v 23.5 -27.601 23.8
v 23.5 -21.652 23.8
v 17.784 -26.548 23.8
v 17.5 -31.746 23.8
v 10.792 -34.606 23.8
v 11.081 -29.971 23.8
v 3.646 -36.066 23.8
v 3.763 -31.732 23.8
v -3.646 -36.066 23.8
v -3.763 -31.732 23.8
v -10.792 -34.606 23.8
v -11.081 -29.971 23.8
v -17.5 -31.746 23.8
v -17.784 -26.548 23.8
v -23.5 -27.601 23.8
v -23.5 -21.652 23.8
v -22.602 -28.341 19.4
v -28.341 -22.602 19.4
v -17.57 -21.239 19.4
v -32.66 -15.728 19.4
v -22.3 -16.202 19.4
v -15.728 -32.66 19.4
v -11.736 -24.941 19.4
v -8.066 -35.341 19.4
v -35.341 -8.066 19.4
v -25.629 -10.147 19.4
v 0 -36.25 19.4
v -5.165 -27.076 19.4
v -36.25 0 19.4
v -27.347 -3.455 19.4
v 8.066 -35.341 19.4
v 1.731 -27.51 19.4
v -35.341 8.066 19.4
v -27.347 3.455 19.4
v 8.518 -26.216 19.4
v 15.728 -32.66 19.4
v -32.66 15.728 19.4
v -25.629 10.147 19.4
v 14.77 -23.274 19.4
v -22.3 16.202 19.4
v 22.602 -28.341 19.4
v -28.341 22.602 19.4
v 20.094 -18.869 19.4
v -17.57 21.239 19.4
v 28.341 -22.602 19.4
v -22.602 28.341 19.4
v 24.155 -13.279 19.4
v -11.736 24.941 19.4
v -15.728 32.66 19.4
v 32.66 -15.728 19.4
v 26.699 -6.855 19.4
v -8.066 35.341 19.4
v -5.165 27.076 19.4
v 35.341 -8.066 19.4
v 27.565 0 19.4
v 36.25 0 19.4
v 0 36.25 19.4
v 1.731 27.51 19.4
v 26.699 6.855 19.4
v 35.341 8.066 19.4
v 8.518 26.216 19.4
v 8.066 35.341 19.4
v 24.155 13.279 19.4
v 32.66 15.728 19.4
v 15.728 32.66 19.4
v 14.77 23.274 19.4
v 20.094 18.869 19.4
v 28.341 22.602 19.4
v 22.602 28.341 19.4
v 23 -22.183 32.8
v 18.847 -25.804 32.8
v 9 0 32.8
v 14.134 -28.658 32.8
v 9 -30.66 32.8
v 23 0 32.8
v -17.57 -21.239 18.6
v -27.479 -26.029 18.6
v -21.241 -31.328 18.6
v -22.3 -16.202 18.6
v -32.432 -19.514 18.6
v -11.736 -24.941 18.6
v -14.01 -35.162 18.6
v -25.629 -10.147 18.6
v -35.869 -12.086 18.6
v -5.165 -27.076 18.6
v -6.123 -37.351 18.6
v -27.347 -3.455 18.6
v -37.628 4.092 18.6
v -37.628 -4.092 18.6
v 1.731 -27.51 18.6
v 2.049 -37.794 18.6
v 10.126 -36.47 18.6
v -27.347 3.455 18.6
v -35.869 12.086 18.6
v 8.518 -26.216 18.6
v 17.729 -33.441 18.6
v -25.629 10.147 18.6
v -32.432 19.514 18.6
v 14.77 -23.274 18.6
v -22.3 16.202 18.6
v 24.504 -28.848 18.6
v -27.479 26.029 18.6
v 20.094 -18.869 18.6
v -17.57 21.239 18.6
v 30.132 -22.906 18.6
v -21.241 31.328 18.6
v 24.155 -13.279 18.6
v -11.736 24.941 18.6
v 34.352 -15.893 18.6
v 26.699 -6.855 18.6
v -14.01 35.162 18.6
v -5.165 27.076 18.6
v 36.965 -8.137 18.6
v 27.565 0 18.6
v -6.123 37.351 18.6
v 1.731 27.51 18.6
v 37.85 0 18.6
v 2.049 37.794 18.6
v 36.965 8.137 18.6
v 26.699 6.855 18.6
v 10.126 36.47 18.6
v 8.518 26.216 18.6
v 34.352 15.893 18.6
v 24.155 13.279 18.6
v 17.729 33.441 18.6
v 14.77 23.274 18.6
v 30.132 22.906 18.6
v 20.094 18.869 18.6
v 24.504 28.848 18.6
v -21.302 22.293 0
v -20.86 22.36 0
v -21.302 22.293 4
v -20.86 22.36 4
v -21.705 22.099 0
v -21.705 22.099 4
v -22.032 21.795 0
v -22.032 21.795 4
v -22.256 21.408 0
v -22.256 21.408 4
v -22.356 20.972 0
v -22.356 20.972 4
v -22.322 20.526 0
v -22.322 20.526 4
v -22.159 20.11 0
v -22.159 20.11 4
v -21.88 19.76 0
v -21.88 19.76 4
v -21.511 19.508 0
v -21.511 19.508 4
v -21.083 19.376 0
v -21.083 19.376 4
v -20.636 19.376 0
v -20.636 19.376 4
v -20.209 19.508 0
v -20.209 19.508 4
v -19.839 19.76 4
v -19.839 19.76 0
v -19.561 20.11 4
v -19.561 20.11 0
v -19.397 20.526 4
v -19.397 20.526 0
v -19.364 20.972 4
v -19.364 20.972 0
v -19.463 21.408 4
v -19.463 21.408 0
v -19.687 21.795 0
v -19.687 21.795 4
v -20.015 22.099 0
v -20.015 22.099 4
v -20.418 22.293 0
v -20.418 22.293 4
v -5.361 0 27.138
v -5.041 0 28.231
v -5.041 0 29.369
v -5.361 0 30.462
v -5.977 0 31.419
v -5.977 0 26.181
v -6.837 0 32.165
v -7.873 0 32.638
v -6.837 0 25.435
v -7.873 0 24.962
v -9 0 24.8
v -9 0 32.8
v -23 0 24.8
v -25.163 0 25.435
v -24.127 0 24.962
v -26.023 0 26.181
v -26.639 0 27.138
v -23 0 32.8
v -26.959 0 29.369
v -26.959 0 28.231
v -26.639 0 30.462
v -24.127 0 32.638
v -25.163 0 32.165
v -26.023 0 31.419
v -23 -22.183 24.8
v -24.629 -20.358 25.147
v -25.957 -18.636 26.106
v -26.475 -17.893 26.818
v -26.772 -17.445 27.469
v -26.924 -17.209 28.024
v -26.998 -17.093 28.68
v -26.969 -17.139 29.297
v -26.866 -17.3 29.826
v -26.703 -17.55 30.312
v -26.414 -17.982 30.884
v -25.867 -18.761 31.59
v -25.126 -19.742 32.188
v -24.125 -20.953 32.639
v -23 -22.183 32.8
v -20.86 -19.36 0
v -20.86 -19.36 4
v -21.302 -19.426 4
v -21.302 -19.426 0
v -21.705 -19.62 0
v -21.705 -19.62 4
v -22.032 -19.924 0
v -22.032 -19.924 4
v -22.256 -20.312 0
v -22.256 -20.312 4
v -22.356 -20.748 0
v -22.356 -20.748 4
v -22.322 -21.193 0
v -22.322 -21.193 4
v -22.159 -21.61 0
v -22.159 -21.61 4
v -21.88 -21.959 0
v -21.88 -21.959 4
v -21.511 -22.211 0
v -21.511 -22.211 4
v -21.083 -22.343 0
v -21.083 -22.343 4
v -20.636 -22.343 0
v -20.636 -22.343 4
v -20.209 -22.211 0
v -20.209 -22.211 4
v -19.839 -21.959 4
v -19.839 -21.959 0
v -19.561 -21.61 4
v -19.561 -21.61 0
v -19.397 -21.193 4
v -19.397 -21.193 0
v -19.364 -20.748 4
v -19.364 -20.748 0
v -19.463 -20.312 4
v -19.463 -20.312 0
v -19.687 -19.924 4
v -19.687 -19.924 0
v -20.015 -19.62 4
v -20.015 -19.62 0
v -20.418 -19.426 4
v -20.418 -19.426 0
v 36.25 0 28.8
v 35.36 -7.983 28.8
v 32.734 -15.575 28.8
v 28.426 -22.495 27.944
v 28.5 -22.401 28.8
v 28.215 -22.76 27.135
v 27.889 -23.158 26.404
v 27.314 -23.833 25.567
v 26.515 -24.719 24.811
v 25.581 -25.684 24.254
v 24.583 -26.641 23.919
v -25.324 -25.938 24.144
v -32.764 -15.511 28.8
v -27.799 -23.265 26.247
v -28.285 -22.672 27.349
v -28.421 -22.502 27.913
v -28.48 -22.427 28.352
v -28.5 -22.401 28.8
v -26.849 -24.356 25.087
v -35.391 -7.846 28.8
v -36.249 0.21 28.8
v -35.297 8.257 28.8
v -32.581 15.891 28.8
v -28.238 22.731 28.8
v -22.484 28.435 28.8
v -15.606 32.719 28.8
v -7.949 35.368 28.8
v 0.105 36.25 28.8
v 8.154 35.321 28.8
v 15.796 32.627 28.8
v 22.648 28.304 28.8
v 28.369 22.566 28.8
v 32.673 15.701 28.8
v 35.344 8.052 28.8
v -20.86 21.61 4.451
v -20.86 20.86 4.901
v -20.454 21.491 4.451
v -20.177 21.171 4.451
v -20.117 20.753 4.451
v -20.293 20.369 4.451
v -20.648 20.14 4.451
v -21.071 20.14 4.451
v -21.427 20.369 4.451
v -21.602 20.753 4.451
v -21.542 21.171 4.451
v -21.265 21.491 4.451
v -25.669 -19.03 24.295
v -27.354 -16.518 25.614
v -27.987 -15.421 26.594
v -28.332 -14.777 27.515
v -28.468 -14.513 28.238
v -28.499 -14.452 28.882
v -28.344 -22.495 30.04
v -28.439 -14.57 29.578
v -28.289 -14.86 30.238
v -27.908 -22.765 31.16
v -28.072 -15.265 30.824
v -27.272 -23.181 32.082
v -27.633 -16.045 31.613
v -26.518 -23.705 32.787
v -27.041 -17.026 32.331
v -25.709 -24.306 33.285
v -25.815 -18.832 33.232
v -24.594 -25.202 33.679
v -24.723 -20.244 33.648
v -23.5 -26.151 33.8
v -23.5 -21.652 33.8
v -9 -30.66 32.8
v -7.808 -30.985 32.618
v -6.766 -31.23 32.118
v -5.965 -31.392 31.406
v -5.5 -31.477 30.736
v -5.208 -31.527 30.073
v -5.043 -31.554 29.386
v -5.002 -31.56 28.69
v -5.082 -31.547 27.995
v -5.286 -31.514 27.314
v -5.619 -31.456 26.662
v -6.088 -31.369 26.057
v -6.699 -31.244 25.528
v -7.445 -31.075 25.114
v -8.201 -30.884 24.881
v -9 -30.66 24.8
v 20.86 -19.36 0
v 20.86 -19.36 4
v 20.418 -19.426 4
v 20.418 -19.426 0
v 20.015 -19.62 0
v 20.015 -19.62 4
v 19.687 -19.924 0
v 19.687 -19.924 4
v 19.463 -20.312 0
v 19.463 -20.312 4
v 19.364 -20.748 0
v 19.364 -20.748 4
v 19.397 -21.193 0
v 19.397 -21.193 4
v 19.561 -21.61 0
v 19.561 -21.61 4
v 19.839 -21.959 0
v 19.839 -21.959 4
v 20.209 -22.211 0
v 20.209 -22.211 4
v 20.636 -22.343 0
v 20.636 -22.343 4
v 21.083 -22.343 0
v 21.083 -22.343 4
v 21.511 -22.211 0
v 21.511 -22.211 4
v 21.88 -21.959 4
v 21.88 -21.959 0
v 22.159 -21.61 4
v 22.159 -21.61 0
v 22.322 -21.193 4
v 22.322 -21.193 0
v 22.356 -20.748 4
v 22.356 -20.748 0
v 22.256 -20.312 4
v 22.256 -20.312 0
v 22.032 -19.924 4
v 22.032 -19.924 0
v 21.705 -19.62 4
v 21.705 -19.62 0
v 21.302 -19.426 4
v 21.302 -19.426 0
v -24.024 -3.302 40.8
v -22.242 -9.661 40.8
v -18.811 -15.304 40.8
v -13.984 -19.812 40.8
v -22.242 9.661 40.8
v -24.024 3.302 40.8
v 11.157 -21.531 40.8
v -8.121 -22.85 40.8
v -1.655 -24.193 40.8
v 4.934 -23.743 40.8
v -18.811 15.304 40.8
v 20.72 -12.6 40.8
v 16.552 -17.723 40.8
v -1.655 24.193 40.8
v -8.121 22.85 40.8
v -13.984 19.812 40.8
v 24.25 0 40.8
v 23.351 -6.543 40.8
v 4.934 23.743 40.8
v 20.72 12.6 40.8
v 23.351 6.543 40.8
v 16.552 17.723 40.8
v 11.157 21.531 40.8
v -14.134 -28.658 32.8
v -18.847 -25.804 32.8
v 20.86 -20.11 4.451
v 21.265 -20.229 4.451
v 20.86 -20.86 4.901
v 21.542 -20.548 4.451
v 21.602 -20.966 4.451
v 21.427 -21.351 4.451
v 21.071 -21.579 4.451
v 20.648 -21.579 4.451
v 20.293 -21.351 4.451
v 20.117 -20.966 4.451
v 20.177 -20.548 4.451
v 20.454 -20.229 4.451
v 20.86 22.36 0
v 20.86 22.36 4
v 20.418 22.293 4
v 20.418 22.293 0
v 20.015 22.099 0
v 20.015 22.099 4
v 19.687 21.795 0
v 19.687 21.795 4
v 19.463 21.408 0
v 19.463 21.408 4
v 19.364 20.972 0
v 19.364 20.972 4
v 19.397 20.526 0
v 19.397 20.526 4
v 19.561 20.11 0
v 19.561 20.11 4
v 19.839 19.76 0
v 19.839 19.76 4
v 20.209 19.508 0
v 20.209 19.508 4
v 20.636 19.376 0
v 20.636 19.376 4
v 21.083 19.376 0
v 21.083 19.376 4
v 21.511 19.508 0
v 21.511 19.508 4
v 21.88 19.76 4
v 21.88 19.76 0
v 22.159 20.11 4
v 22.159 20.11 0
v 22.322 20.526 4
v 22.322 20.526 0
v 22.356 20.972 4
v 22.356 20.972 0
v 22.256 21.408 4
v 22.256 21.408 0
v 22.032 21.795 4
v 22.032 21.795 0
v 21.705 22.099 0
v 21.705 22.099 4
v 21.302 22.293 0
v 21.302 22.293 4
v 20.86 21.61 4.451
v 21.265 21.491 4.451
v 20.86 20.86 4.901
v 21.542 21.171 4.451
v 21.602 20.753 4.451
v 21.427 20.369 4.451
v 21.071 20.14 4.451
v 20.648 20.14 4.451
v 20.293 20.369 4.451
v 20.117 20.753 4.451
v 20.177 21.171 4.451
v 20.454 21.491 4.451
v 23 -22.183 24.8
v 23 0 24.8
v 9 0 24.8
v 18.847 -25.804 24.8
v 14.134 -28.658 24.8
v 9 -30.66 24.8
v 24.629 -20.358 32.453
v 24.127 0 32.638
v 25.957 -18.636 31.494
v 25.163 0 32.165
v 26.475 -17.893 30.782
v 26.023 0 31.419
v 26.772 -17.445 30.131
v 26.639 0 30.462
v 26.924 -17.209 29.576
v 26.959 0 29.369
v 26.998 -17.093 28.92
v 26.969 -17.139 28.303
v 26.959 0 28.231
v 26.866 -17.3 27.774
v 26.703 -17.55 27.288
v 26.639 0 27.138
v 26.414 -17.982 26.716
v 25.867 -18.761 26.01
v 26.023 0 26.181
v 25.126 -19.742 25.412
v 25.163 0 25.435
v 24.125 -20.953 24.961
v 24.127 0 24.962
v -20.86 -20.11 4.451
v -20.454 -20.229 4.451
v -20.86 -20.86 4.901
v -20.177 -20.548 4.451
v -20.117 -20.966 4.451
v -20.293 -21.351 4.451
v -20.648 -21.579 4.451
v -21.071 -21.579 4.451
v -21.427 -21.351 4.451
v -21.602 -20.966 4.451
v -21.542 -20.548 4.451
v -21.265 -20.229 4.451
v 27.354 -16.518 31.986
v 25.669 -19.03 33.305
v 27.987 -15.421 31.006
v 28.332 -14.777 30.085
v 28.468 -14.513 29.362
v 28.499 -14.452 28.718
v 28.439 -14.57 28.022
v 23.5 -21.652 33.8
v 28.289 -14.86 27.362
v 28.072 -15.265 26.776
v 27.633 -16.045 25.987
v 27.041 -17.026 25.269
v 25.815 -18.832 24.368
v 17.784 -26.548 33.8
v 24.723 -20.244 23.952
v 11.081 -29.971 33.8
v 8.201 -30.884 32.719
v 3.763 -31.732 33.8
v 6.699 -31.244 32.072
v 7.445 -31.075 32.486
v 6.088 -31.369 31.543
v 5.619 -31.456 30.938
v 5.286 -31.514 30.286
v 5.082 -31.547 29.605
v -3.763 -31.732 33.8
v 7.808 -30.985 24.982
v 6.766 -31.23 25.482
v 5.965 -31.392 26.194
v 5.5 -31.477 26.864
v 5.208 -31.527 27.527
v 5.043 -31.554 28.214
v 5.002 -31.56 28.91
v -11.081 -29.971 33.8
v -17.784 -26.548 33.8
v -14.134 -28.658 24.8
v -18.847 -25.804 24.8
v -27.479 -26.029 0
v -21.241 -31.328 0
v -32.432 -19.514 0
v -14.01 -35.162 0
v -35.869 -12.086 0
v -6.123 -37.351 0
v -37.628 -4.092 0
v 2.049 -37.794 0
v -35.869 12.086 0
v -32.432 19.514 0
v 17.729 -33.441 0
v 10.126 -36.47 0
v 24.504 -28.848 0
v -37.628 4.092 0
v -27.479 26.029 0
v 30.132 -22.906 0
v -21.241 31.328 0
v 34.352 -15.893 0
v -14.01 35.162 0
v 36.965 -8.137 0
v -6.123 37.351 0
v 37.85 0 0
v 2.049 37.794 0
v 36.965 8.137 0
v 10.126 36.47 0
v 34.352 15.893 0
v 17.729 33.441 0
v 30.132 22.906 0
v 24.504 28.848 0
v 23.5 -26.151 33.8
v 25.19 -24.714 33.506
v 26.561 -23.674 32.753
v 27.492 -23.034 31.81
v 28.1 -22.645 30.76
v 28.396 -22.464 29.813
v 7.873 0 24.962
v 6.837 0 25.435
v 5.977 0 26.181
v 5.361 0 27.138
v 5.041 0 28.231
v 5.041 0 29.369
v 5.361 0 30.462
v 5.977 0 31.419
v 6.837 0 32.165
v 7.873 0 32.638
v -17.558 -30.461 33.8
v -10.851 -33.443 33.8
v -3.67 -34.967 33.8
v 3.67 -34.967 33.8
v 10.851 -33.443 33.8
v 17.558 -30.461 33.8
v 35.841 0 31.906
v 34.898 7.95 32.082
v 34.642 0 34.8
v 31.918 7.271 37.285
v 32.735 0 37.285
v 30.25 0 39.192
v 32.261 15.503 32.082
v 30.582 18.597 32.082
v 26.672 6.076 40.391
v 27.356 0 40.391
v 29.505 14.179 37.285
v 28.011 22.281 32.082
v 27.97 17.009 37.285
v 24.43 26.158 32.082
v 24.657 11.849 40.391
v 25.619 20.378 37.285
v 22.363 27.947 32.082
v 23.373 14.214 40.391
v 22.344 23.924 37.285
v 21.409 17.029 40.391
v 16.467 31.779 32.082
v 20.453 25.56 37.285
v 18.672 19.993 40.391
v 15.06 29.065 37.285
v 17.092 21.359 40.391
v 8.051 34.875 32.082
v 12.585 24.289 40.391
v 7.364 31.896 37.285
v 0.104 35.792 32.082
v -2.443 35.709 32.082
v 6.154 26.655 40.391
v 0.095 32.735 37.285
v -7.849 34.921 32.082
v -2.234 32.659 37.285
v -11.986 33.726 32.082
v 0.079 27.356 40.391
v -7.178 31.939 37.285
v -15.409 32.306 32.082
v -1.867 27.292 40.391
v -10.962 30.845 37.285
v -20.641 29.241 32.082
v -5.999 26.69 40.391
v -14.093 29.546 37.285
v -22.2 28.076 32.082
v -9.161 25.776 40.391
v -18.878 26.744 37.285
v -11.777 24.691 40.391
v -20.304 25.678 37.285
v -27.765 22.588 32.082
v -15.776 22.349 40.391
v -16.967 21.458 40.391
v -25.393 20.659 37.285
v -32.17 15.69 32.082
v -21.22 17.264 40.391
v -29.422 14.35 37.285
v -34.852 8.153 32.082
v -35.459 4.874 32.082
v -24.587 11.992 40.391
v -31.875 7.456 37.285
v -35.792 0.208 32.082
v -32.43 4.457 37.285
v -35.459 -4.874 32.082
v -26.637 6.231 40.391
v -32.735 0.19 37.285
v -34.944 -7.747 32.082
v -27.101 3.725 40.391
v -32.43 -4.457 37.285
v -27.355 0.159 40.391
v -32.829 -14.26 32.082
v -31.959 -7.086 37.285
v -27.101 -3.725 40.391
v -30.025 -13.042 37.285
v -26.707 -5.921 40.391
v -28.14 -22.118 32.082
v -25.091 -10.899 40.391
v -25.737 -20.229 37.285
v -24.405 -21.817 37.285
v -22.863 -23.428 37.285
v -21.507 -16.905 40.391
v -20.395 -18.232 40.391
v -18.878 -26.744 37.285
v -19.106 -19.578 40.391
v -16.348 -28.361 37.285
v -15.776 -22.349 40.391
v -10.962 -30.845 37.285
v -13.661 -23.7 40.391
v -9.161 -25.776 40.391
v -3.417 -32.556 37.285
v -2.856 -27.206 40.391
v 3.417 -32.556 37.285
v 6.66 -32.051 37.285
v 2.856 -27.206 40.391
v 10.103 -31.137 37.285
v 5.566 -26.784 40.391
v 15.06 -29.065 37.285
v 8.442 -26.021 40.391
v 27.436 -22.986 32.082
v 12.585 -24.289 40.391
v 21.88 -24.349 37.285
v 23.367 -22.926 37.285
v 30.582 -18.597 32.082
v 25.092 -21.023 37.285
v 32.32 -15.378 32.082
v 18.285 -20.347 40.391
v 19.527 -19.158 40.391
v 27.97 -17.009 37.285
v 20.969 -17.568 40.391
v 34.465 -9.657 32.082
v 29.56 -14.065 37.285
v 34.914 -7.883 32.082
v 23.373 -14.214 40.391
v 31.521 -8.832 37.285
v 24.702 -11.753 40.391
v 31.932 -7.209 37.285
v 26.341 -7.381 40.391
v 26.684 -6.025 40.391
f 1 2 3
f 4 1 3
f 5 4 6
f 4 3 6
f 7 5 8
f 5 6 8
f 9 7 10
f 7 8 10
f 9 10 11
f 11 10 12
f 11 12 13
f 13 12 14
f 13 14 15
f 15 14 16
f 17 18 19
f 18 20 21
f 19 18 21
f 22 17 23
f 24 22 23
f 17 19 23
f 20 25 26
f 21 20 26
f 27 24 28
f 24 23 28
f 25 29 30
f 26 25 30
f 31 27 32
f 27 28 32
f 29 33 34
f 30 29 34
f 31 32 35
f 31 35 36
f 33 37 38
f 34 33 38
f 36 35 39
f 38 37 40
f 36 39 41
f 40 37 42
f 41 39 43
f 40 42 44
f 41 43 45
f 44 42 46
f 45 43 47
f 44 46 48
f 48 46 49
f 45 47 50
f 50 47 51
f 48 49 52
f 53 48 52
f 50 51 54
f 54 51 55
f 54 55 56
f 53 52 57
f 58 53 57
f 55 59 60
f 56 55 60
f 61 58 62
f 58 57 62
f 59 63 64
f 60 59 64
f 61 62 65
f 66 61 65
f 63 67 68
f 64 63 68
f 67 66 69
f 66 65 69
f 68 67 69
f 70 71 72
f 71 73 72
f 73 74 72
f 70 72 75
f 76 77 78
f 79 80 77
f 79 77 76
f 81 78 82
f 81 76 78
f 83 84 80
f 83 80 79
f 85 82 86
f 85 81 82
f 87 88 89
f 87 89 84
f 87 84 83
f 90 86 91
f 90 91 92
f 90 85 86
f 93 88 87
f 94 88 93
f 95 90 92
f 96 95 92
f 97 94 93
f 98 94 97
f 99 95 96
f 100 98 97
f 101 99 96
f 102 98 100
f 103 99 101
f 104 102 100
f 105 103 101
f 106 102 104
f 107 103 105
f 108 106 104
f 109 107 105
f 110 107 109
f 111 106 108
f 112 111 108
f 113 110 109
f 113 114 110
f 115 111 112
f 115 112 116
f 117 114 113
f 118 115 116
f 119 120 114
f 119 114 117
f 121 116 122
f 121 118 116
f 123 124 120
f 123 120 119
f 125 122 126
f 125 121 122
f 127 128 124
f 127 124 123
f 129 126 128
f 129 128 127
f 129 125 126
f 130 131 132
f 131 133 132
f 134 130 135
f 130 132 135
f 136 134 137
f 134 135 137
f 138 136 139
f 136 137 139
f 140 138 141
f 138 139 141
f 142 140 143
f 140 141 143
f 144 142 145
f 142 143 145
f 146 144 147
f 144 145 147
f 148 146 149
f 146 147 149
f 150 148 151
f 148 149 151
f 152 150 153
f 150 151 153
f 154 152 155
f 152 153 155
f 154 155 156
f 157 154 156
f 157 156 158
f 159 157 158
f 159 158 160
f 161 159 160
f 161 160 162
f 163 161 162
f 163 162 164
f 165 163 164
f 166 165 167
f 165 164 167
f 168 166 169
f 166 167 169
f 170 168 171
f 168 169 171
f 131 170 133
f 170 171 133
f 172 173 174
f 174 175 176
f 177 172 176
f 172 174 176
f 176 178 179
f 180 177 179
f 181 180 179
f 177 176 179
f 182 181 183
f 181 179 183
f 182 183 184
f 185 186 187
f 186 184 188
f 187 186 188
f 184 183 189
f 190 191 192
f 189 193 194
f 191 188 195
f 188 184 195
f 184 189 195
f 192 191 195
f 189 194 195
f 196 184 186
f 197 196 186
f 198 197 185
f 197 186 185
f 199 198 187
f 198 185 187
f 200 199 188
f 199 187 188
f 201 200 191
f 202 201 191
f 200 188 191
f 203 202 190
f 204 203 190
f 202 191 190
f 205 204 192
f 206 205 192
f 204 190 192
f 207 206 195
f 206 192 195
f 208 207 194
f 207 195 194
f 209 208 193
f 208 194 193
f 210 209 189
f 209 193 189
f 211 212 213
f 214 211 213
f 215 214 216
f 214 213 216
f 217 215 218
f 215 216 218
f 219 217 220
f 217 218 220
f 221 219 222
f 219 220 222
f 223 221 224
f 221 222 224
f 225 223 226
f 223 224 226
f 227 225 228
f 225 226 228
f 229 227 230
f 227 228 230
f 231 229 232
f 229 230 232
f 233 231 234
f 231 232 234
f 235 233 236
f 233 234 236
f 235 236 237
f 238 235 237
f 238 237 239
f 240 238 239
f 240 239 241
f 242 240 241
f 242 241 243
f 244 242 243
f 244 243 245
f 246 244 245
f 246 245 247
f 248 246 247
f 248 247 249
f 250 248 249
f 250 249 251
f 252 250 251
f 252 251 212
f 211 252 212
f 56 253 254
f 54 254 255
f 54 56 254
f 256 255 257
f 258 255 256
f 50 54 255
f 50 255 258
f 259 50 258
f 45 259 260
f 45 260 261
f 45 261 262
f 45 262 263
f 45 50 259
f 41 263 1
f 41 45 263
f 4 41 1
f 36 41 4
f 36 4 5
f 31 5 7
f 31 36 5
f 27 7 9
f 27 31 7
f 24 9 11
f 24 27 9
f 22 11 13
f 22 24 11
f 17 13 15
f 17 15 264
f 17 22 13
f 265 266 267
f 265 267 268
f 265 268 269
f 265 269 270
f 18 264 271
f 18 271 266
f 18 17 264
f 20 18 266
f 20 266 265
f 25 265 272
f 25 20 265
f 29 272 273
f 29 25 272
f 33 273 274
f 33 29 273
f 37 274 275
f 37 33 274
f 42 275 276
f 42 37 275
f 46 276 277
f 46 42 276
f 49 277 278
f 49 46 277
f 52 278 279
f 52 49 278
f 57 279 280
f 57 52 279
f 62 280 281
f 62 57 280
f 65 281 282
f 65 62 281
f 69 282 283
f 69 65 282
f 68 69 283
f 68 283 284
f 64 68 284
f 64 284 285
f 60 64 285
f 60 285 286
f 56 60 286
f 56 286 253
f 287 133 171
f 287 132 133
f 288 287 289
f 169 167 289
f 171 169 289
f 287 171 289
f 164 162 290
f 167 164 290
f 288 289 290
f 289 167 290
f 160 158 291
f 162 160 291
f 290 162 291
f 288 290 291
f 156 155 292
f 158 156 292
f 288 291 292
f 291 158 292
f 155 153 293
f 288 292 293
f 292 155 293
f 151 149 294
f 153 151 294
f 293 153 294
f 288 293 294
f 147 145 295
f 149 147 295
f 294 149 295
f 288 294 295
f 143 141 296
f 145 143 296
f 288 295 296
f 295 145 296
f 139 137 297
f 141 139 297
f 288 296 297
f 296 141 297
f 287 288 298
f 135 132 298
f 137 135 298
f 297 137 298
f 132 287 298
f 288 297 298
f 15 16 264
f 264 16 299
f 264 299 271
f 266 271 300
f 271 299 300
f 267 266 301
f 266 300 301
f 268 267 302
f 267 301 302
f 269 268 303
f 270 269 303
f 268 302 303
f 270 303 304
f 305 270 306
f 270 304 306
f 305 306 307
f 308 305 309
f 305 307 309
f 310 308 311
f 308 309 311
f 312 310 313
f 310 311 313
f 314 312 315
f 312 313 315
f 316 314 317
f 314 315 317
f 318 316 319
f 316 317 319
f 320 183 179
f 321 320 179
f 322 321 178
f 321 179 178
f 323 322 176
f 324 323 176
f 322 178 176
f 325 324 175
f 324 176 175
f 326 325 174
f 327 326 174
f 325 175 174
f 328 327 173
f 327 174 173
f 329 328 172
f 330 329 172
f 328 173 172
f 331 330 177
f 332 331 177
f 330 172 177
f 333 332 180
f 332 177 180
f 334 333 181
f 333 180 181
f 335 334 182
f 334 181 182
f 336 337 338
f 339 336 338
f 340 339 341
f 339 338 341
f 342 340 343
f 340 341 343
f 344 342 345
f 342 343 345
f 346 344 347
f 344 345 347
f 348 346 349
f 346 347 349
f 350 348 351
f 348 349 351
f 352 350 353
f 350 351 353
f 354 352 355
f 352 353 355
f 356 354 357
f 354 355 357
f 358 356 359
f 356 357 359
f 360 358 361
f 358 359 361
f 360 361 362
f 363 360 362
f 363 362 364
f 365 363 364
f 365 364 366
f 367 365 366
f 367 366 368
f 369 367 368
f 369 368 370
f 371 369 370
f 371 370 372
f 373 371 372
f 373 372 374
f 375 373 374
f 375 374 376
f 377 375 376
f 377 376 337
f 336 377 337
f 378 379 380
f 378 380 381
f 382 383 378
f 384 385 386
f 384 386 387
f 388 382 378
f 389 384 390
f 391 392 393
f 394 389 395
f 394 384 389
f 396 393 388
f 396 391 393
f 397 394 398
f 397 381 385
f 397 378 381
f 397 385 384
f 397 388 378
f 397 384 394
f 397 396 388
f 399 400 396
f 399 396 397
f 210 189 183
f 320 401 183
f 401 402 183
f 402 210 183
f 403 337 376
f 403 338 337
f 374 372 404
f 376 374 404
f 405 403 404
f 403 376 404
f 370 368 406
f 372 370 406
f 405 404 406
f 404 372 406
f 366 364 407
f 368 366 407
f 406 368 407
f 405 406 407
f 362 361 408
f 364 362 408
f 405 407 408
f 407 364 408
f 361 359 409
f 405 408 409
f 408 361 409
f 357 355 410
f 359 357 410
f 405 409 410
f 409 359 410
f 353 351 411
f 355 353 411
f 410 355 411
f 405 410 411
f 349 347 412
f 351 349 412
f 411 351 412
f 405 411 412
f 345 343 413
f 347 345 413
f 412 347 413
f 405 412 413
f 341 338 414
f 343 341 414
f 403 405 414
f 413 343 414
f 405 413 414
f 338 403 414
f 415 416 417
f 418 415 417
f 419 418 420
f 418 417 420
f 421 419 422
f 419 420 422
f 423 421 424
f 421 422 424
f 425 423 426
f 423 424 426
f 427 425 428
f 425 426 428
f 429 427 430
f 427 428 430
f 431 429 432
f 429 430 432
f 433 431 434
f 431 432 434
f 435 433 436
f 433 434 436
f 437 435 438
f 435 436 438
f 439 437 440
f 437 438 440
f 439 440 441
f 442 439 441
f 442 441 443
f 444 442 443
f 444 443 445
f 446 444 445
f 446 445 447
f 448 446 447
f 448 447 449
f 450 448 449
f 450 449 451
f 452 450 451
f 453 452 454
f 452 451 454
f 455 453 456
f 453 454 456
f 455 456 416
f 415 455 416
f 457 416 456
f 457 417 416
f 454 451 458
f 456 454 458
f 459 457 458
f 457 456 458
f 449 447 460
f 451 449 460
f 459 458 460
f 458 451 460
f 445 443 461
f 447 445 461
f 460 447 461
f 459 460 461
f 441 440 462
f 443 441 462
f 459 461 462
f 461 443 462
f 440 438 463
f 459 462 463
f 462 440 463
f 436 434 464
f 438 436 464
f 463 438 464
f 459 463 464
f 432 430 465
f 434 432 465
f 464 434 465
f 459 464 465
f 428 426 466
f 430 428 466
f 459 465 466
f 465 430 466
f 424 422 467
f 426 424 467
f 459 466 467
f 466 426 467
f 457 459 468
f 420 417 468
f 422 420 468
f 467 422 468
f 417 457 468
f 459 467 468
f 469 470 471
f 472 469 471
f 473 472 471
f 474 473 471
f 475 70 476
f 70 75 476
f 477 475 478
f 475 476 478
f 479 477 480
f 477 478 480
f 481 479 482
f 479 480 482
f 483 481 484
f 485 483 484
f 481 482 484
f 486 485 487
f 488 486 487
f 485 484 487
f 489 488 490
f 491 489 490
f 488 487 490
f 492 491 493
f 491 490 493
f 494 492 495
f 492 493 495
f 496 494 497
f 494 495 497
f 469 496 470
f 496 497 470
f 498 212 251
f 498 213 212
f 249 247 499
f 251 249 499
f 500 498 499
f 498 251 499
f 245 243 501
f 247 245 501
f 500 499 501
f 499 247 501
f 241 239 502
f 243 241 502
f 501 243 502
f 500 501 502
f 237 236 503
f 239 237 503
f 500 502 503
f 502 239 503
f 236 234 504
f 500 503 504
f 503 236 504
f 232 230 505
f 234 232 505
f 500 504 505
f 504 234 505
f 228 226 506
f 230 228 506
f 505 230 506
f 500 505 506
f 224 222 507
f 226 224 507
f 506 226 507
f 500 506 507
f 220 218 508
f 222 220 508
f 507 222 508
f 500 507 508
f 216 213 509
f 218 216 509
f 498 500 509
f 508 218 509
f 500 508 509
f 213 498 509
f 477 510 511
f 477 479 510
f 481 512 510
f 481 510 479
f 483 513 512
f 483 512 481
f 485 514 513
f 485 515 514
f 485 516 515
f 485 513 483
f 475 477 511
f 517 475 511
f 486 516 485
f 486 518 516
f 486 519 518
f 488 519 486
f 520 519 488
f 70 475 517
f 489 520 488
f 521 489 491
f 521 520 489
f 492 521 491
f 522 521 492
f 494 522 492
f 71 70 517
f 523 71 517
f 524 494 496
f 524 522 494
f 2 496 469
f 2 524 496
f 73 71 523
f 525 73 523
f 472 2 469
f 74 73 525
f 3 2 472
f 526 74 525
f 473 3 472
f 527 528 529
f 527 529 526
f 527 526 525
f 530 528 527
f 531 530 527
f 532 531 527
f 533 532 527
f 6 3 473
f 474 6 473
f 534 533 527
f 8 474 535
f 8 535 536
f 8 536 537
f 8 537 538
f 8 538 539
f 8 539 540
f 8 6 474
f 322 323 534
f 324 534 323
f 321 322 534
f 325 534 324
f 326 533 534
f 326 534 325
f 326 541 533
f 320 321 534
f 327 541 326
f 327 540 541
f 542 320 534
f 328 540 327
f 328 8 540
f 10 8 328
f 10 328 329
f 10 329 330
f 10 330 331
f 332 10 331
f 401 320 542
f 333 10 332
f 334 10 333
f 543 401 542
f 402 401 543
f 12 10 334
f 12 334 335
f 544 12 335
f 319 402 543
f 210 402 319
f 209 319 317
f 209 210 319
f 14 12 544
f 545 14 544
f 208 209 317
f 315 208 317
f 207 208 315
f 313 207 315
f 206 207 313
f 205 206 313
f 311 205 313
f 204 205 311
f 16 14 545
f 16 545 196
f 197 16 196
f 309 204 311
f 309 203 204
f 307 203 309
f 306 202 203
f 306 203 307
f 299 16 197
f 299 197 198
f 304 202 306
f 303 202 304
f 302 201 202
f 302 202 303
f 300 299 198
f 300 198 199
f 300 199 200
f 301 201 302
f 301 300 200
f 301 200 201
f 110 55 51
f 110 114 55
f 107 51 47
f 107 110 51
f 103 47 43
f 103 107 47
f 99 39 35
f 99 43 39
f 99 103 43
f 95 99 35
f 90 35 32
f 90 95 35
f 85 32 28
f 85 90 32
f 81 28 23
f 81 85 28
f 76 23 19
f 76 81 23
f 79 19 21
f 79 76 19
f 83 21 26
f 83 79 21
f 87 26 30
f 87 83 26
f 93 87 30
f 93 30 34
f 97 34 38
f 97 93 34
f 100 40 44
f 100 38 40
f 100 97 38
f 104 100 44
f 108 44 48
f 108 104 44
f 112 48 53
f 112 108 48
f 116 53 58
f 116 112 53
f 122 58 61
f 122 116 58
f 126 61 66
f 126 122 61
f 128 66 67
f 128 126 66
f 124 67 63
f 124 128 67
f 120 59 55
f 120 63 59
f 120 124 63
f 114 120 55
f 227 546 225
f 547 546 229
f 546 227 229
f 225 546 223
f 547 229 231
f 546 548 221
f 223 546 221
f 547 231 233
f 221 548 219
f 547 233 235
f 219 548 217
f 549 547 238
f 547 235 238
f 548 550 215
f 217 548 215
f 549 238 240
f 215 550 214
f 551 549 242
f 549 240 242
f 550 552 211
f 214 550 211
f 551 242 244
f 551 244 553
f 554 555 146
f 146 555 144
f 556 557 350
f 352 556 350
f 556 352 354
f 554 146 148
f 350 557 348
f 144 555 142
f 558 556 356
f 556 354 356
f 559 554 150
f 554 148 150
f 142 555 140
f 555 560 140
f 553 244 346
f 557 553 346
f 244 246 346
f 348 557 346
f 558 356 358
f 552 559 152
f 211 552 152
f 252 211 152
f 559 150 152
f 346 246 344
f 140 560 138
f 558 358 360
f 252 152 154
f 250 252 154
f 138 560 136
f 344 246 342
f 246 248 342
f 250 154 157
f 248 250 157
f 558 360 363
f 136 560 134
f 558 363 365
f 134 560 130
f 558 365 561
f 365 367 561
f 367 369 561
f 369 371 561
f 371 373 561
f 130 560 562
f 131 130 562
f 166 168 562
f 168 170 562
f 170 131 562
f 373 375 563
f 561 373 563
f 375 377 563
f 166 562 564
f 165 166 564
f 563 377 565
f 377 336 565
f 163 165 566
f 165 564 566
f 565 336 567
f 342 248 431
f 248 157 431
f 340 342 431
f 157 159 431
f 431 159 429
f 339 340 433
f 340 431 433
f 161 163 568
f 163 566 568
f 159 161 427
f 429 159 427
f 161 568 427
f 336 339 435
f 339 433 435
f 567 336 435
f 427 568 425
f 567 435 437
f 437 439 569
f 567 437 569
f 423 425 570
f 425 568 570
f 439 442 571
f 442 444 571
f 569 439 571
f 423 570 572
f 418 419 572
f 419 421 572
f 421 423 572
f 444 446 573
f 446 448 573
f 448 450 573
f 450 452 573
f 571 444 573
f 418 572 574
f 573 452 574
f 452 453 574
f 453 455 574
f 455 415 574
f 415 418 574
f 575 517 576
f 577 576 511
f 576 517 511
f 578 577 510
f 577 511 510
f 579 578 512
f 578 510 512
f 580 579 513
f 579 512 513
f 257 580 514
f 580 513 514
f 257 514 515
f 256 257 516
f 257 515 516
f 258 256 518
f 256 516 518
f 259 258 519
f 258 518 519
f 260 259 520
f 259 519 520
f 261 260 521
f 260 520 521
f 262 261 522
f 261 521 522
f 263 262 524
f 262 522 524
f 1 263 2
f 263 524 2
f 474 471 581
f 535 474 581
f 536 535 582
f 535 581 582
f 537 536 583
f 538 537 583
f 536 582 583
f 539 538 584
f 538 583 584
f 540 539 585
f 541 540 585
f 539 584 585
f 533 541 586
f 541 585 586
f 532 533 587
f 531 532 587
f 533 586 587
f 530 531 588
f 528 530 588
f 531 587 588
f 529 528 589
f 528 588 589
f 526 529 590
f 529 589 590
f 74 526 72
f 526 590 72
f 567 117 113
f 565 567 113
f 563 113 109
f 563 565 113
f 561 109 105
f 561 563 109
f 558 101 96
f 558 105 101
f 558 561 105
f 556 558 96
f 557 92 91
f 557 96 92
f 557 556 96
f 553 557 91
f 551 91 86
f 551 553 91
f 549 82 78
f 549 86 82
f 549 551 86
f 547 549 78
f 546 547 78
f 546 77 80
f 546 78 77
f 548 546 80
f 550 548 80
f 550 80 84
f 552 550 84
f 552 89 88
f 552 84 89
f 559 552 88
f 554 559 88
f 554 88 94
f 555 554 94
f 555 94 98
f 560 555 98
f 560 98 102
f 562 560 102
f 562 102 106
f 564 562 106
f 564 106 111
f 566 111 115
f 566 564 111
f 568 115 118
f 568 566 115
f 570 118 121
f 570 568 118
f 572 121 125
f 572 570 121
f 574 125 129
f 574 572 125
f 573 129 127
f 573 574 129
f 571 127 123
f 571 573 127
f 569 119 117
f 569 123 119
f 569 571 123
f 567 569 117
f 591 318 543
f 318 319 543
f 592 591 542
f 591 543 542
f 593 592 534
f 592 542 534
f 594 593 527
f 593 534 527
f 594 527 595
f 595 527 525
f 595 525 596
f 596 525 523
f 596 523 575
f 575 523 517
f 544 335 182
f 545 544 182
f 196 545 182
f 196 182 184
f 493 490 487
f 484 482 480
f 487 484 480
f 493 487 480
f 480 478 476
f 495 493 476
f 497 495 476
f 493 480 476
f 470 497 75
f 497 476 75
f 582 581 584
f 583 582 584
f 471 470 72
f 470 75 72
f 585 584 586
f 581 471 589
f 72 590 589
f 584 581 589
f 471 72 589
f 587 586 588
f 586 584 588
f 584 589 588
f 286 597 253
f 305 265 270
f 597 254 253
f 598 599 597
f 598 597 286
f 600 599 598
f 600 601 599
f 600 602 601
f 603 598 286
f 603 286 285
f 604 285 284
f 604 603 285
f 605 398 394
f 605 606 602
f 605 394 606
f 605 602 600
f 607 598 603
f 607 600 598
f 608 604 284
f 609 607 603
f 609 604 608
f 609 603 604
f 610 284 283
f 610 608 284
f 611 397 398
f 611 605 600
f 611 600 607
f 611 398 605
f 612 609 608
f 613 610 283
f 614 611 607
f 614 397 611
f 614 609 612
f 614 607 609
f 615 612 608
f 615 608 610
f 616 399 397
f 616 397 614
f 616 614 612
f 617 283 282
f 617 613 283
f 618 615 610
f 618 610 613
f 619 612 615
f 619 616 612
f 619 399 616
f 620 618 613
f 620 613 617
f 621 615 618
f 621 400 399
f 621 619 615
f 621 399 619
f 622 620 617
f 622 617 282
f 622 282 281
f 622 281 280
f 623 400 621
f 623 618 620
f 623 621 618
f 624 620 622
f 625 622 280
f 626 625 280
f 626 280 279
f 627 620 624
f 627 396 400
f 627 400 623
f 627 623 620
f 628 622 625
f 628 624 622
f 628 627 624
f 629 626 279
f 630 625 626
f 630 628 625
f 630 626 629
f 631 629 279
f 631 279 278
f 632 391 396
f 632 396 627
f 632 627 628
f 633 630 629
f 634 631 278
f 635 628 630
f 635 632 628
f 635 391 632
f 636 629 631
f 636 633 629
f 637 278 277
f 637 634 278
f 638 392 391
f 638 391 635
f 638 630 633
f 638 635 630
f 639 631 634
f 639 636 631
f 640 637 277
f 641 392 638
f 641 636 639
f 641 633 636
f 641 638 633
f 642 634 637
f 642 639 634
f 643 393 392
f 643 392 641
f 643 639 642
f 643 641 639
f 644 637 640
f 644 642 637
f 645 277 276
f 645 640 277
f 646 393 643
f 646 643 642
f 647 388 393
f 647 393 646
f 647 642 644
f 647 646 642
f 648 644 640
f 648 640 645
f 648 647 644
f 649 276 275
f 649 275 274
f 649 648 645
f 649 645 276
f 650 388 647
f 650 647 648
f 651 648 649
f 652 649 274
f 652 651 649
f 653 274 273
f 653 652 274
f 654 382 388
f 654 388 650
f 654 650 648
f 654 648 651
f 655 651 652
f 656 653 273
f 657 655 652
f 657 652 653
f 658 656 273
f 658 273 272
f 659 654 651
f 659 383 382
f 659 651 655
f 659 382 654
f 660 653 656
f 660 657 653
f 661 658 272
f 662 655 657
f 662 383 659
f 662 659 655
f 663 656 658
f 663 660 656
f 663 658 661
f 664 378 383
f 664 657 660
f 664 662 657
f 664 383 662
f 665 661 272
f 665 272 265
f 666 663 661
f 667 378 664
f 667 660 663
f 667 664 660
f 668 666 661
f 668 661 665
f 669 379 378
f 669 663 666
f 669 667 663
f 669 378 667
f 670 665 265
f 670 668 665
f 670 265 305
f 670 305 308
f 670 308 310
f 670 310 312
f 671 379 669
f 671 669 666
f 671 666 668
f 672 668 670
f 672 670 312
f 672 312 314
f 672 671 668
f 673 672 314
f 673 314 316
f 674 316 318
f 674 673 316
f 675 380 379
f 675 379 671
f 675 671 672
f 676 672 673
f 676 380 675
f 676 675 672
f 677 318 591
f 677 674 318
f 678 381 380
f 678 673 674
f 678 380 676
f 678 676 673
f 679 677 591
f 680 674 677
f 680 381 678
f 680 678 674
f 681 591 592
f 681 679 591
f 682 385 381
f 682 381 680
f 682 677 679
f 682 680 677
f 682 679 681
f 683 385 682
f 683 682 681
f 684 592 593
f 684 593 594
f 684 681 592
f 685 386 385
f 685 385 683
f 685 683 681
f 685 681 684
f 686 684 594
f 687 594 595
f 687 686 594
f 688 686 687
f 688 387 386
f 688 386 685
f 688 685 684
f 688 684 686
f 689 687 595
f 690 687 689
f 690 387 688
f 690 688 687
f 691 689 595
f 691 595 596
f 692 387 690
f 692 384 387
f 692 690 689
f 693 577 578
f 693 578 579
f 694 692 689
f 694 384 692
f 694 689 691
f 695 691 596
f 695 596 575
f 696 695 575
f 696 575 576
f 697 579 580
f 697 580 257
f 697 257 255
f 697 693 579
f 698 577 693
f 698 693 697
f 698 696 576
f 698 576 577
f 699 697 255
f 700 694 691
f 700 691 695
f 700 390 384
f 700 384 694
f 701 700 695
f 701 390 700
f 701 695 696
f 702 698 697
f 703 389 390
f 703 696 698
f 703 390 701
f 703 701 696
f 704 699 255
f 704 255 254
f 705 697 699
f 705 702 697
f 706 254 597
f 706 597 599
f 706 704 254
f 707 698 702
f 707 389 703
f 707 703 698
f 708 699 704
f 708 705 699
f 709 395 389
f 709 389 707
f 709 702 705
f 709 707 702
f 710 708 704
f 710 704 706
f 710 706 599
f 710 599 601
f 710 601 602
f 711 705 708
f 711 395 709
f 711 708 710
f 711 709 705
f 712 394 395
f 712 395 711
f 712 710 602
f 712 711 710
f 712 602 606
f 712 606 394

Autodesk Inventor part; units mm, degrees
ref_plane "YZ Plane" through (0, 0, 0) normal (1, 0, 0) x (0, 1, 0)
ref_plane "XZ Plane" through (0, 0, 0) normal (0, 1, 0) x (-1, 0, 0)
ref_plane "XY Plane" through (0, 0, 0) normal (0, 0, 1) x (1, 0, 0)
sketch "Skizze1" plane through (0, 0, 0) normal (0, 0, 1) x (1, 0, 0)
  circle A0 centre (0, 0) radius 37.85
  dimension "d0" = 75.7
extrude "Extrusion1" add sketch "Skizze1" along normal blind 18.6
sketch "Skizze2" plane through (0, 0, 18.6) normal (0, 0, 1) x (1, 0, 0)
  circle A0 centre (0, 0) radius 37.85 projected
  circle A1 centre (0, 0) radius 27.5647
extrude "Extrusion2" add sketch "Skizze2" along normal blind 0.8 contours A1
sketch "Skizze3" plane through (0, 0, 19.4) normal (0, 0, 1) x (1, 0, 0)
  circle A0 centre (0, 0) radius 27.5647 projected
  circle A1 centre (0, 0) radius 36.25
  dimension "d5" = 72.5
extrude "Extrusion3" add sketch "Skizze3" along normal blind 21.4 contours A0 | A1
fillet "Rundung1" radius 12 1 edges at (-36.25, 0, 40.8)
sketch "Skizze4" plane through (0, 0, 0) normal (0, 1, 0) x (-1, 0, 0)
  line L0 (36.25, 28.8) -> (-36.25, 28.8) projected
  line L1 (23.5, 28.8) -> (-23.5, 28.8) construction
  line L2 (23.5, 33.8) -> (-23.5, 33.8)
  line L3 (-23.5, 23.8) -> (23.5, 23.8)
  arc A0 (23.5, 23.8) -> (23.5, 33.8) centre (23.5, 28.8) ccw
  arc A1 (-23.5, 33.8) -> (-23.5, 23.8) centre (-23.5, 28.8) ccw
  line L4 (0, -8.16) -> (0, 48.96) construction
  point P0 (0, 0)
  point P1 (0, 28.8)
  dimension "d9" = 10
  dimension "d10" = 47
extrude "Extrusion4" cut sketch "Skizze4" against normal through all
sketch "Skizze5" plane through (0, 0, 19.4) normal (0, 0, -1) x (-1, 0, 0)
  circle A0 centre (0, 0) radius 27.5647 projected
  circle A1 centre (0, 0) radius 31.9541
extrude "Extrusion5" add sketch "Skizze5" against normal blind 15 contours A0 | A1
sketch "Skizze6" plane through (0, 0, 0) normal (0, 1, 0) x (-1, 0, 0)
  line L0 (40.5995, 28.8) -> (-50.4498, 28.8) construction
  line L1 (36.25, 19.4) -> (-36.25, 19.4) construction
  line L2 (0, -8.16) -> (0, 48.96) construction
  line L3 (23, 28.8) -> (9, 28.8) construction
  line L4 (23, 32.8) -> (9, 32.8)
  line L5 (9, 24.8) -> (23, 24.8)
  arc A0 (23, 24.8) -> (23, 32.8) centre (23, 28.8) ccw
  arc A1 (9, 32.8) -> (9, 24.8) centre (9, 28.8) ccw
  line L6 (-9, 28.8) -> (-23, 28.8) construction
  line L7 (-9, 32.8) -> (-23, 32.8)
  line L8 (-23, 24.8) -> (-9, 24.8)
  arc A2 (-9, 24.8) -> (-9, 32.8) centre (-9, 28.8) ccw
  arc A3 (-23, 32.8) -> (-23, 24.8) centre (-23, 28.8) ccw
  point P0 (0, 0)
  point P1 (16, 28.8)
  point P2 (-16, 28.8)
  dimension "d15" = 9.4
  dimension "d16" = 14
  dimension "d17" = 10
  dimension "d20" = 8
extrude "Extrusion6" cut sketch "Skizze6" against normal through all
sketch "Skizze7" plane through (0, 0, 0) normal (0, 0, -1) x (-1, 0, 0)
  circle A0 centre (0, 0) radius 29.5 construction
  line L0 (20.8597, 20.8597) -> (-20.8597, 20.8597) construction
  line L1 (-20.8597, 20.8597) -> (-20.8597, -20.8597) construction
  line L2 (-20.8597, -20.8597) -> (20.8597, -20.8597) construction
  line L3 (20.8597, -20.8597) -> (20.8597, 20.8597) construction
  line L4 (20.8597, 20.8597) -> (-20.8597, -20.8597) construction
  line L5 (-20.8597, 20.8597) -> (20.8597, -20.8597) construction
  dimension "d21" = 59
hole "Bohrung1" at (-20.8597, -20.8597, 0) at (20.8597, -20.8597, 0) at (20.8597, 20.8597, 0) at (-20.8597, 20.8597, 0) direction (0, 0, 1) diameter 3 depth 4 tip angle 118
properties part number "RPLidar A2" material "Kupfer, Guss"
